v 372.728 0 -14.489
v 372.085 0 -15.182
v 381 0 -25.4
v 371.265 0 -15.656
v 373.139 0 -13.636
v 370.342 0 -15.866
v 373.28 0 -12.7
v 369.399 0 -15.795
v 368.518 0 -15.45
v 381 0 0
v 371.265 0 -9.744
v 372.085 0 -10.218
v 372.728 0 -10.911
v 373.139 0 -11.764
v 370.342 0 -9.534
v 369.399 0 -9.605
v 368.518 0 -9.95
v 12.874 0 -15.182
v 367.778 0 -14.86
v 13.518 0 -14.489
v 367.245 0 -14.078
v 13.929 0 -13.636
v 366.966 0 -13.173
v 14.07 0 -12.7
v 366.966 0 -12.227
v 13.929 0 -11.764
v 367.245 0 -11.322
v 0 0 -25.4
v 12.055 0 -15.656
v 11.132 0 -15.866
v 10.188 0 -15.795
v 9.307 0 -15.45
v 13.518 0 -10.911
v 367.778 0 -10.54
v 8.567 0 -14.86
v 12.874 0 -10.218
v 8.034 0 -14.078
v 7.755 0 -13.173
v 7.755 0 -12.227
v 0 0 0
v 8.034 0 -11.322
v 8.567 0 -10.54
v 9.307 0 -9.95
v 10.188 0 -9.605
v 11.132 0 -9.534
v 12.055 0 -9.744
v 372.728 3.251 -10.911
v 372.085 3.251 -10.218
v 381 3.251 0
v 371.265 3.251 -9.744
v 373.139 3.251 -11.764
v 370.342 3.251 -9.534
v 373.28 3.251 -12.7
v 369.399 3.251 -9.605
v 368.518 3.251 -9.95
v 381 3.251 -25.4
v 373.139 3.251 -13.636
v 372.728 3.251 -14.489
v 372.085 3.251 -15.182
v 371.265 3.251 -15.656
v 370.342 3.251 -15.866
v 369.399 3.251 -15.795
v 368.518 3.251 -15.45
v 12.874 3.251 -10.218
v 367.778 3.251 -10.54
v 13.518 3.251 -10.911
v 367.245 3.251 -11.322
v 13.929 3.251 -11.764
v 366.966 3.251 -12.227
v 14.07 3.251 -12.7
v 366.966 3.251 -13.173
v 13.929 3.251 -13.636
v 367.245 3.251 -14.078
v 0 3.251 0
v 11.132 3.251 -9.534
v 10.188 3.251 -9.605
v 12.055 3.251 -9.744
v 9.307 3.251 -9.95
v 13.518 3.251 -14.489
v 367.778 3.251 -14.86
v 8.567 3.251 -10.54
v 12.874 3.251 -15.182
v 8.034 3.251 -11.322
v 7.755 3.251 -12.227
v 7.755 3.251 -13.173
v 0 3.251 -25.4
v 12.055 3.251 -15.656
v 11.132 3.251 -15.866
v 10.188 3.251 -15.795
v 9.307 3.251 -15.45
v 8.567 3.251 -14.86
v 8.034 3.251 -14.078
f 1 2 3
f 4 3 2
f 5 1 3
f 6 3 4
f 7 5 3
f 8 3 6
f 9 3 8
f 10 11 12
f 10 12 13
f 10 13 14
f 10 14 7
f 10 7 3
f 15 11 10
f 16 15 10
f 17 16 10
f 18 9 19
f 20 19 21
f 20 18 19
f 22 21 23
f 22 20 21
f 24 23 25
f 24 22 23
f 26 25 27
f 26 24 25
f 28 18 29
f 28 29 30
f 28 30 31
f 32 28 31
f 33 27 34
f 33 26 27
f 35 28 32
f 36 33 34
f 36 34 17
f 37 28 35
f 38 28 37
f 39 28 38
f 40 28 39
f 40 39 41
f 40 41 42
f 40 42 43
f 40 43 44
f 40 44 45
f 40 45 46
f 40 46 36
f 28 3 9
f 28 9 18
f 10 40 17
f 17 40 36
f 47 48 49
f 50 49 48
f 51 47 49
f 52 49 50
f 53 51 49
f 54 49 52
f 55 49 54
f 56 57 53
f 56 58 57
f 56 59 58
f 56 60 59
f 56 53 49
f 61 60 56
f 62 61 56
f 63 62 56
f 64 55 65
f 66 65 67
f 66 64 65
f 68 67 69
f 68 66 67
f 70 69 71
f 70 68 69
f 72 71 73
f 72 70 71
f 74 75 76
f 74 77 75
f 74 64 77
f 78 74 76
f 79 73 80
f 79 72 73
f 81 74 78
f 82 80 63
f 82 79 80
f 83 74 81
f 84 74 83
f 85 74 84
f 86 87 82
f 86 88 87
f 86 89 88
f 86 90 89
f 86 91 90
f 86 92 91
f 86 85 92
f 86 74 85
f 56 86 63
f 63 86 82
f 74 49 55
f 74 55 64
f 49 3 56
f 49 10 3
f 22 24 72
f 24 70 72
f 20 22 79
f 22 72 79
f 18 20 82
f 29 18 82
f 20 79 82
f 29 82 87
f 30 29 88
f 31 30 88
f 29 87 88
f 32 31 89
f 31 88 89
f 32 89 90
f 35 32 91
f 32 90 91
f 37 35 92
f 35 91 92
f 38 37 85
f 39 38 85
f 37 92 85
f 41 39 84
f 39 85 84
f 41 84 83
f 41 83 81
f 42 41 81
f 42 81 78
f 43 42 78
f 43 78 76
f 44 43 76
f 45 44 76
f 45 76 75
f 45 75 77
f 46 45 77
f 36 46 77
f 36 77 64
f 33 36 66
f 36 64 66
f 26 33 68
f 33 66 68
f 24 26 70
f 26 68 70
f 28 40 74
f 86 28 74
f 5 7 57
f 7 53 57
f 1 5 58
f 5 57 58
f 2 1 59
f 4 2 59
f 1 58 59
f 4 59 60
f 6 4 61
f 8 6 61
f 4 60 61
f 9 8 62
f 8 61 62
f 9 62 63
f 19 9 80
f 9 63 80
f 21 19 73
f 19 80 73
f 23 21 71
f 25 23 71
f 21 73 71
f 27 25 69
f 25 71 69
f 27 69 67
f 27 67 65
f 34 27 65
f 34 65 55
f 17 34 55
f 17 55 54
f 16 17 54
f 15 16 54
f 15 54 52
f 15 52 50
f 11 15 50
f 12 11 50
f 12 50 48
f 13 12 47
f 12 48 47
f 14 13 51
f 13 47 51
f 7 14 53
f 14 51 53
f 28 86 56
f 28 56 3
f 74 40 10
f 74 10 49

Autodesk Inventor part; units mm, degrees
ref_plane "YZ Plane" through (0, 0, 0) normal (1, 0, 0) x (0, 1, 0)
ref_plane "XZ Plane" through (0, 0, 0) normal (0, 1, 0) x (-1, 0, 0)
ref_plane "XY Plane" through (0, 0, 0) normal (0, 0, 1) x (1, 0, 0)
sketch "Sketch1" plane through (0, 0, 0) normal (1, 0, 0) x (0, 1, 0)
  line L0 (0, 0) -> (3.2512, 0)
  line L1 (3.2512, 0) -> (3.2512, -25.4)
  line L2 (3.2512, -25.4) -> (0, -25.4)
  line L3 (0, -25.4) -> (0, 0)
  dimension "d0" = 3.2512
  dimension "d1" = 25.4
extrude "Extrusion1" add sketch "Sketch1" along normal blind 381
sketch "Sketch2" plane through (0, 3.2512, 0) normal (0, 1, 0) x (1, 0, 0)
  line L0 (0, 25.4) -> (0, 0) projected
  line L1 (0, 12.7) -> (85.4474, 12.7) construction
  circle A0 centre (10.8949, 12.7) radius 3.175
  line L2 (0, 0) -> (381, 0) projected
  line L3 (190.5, 0) -> (190.5, 15.076) construction
  line L4 (381, 12.7) -> (295.5526, 12.7) construction
  circle A1 centre (370.1051, 12.7) radius 3.175
  dimension "d4" = 6.35
  dimension "d5" = 179.6051
extrude "Extrusion2" cut sketch "Sketch2" against normal blind 381
properties part number "Long support flat"
